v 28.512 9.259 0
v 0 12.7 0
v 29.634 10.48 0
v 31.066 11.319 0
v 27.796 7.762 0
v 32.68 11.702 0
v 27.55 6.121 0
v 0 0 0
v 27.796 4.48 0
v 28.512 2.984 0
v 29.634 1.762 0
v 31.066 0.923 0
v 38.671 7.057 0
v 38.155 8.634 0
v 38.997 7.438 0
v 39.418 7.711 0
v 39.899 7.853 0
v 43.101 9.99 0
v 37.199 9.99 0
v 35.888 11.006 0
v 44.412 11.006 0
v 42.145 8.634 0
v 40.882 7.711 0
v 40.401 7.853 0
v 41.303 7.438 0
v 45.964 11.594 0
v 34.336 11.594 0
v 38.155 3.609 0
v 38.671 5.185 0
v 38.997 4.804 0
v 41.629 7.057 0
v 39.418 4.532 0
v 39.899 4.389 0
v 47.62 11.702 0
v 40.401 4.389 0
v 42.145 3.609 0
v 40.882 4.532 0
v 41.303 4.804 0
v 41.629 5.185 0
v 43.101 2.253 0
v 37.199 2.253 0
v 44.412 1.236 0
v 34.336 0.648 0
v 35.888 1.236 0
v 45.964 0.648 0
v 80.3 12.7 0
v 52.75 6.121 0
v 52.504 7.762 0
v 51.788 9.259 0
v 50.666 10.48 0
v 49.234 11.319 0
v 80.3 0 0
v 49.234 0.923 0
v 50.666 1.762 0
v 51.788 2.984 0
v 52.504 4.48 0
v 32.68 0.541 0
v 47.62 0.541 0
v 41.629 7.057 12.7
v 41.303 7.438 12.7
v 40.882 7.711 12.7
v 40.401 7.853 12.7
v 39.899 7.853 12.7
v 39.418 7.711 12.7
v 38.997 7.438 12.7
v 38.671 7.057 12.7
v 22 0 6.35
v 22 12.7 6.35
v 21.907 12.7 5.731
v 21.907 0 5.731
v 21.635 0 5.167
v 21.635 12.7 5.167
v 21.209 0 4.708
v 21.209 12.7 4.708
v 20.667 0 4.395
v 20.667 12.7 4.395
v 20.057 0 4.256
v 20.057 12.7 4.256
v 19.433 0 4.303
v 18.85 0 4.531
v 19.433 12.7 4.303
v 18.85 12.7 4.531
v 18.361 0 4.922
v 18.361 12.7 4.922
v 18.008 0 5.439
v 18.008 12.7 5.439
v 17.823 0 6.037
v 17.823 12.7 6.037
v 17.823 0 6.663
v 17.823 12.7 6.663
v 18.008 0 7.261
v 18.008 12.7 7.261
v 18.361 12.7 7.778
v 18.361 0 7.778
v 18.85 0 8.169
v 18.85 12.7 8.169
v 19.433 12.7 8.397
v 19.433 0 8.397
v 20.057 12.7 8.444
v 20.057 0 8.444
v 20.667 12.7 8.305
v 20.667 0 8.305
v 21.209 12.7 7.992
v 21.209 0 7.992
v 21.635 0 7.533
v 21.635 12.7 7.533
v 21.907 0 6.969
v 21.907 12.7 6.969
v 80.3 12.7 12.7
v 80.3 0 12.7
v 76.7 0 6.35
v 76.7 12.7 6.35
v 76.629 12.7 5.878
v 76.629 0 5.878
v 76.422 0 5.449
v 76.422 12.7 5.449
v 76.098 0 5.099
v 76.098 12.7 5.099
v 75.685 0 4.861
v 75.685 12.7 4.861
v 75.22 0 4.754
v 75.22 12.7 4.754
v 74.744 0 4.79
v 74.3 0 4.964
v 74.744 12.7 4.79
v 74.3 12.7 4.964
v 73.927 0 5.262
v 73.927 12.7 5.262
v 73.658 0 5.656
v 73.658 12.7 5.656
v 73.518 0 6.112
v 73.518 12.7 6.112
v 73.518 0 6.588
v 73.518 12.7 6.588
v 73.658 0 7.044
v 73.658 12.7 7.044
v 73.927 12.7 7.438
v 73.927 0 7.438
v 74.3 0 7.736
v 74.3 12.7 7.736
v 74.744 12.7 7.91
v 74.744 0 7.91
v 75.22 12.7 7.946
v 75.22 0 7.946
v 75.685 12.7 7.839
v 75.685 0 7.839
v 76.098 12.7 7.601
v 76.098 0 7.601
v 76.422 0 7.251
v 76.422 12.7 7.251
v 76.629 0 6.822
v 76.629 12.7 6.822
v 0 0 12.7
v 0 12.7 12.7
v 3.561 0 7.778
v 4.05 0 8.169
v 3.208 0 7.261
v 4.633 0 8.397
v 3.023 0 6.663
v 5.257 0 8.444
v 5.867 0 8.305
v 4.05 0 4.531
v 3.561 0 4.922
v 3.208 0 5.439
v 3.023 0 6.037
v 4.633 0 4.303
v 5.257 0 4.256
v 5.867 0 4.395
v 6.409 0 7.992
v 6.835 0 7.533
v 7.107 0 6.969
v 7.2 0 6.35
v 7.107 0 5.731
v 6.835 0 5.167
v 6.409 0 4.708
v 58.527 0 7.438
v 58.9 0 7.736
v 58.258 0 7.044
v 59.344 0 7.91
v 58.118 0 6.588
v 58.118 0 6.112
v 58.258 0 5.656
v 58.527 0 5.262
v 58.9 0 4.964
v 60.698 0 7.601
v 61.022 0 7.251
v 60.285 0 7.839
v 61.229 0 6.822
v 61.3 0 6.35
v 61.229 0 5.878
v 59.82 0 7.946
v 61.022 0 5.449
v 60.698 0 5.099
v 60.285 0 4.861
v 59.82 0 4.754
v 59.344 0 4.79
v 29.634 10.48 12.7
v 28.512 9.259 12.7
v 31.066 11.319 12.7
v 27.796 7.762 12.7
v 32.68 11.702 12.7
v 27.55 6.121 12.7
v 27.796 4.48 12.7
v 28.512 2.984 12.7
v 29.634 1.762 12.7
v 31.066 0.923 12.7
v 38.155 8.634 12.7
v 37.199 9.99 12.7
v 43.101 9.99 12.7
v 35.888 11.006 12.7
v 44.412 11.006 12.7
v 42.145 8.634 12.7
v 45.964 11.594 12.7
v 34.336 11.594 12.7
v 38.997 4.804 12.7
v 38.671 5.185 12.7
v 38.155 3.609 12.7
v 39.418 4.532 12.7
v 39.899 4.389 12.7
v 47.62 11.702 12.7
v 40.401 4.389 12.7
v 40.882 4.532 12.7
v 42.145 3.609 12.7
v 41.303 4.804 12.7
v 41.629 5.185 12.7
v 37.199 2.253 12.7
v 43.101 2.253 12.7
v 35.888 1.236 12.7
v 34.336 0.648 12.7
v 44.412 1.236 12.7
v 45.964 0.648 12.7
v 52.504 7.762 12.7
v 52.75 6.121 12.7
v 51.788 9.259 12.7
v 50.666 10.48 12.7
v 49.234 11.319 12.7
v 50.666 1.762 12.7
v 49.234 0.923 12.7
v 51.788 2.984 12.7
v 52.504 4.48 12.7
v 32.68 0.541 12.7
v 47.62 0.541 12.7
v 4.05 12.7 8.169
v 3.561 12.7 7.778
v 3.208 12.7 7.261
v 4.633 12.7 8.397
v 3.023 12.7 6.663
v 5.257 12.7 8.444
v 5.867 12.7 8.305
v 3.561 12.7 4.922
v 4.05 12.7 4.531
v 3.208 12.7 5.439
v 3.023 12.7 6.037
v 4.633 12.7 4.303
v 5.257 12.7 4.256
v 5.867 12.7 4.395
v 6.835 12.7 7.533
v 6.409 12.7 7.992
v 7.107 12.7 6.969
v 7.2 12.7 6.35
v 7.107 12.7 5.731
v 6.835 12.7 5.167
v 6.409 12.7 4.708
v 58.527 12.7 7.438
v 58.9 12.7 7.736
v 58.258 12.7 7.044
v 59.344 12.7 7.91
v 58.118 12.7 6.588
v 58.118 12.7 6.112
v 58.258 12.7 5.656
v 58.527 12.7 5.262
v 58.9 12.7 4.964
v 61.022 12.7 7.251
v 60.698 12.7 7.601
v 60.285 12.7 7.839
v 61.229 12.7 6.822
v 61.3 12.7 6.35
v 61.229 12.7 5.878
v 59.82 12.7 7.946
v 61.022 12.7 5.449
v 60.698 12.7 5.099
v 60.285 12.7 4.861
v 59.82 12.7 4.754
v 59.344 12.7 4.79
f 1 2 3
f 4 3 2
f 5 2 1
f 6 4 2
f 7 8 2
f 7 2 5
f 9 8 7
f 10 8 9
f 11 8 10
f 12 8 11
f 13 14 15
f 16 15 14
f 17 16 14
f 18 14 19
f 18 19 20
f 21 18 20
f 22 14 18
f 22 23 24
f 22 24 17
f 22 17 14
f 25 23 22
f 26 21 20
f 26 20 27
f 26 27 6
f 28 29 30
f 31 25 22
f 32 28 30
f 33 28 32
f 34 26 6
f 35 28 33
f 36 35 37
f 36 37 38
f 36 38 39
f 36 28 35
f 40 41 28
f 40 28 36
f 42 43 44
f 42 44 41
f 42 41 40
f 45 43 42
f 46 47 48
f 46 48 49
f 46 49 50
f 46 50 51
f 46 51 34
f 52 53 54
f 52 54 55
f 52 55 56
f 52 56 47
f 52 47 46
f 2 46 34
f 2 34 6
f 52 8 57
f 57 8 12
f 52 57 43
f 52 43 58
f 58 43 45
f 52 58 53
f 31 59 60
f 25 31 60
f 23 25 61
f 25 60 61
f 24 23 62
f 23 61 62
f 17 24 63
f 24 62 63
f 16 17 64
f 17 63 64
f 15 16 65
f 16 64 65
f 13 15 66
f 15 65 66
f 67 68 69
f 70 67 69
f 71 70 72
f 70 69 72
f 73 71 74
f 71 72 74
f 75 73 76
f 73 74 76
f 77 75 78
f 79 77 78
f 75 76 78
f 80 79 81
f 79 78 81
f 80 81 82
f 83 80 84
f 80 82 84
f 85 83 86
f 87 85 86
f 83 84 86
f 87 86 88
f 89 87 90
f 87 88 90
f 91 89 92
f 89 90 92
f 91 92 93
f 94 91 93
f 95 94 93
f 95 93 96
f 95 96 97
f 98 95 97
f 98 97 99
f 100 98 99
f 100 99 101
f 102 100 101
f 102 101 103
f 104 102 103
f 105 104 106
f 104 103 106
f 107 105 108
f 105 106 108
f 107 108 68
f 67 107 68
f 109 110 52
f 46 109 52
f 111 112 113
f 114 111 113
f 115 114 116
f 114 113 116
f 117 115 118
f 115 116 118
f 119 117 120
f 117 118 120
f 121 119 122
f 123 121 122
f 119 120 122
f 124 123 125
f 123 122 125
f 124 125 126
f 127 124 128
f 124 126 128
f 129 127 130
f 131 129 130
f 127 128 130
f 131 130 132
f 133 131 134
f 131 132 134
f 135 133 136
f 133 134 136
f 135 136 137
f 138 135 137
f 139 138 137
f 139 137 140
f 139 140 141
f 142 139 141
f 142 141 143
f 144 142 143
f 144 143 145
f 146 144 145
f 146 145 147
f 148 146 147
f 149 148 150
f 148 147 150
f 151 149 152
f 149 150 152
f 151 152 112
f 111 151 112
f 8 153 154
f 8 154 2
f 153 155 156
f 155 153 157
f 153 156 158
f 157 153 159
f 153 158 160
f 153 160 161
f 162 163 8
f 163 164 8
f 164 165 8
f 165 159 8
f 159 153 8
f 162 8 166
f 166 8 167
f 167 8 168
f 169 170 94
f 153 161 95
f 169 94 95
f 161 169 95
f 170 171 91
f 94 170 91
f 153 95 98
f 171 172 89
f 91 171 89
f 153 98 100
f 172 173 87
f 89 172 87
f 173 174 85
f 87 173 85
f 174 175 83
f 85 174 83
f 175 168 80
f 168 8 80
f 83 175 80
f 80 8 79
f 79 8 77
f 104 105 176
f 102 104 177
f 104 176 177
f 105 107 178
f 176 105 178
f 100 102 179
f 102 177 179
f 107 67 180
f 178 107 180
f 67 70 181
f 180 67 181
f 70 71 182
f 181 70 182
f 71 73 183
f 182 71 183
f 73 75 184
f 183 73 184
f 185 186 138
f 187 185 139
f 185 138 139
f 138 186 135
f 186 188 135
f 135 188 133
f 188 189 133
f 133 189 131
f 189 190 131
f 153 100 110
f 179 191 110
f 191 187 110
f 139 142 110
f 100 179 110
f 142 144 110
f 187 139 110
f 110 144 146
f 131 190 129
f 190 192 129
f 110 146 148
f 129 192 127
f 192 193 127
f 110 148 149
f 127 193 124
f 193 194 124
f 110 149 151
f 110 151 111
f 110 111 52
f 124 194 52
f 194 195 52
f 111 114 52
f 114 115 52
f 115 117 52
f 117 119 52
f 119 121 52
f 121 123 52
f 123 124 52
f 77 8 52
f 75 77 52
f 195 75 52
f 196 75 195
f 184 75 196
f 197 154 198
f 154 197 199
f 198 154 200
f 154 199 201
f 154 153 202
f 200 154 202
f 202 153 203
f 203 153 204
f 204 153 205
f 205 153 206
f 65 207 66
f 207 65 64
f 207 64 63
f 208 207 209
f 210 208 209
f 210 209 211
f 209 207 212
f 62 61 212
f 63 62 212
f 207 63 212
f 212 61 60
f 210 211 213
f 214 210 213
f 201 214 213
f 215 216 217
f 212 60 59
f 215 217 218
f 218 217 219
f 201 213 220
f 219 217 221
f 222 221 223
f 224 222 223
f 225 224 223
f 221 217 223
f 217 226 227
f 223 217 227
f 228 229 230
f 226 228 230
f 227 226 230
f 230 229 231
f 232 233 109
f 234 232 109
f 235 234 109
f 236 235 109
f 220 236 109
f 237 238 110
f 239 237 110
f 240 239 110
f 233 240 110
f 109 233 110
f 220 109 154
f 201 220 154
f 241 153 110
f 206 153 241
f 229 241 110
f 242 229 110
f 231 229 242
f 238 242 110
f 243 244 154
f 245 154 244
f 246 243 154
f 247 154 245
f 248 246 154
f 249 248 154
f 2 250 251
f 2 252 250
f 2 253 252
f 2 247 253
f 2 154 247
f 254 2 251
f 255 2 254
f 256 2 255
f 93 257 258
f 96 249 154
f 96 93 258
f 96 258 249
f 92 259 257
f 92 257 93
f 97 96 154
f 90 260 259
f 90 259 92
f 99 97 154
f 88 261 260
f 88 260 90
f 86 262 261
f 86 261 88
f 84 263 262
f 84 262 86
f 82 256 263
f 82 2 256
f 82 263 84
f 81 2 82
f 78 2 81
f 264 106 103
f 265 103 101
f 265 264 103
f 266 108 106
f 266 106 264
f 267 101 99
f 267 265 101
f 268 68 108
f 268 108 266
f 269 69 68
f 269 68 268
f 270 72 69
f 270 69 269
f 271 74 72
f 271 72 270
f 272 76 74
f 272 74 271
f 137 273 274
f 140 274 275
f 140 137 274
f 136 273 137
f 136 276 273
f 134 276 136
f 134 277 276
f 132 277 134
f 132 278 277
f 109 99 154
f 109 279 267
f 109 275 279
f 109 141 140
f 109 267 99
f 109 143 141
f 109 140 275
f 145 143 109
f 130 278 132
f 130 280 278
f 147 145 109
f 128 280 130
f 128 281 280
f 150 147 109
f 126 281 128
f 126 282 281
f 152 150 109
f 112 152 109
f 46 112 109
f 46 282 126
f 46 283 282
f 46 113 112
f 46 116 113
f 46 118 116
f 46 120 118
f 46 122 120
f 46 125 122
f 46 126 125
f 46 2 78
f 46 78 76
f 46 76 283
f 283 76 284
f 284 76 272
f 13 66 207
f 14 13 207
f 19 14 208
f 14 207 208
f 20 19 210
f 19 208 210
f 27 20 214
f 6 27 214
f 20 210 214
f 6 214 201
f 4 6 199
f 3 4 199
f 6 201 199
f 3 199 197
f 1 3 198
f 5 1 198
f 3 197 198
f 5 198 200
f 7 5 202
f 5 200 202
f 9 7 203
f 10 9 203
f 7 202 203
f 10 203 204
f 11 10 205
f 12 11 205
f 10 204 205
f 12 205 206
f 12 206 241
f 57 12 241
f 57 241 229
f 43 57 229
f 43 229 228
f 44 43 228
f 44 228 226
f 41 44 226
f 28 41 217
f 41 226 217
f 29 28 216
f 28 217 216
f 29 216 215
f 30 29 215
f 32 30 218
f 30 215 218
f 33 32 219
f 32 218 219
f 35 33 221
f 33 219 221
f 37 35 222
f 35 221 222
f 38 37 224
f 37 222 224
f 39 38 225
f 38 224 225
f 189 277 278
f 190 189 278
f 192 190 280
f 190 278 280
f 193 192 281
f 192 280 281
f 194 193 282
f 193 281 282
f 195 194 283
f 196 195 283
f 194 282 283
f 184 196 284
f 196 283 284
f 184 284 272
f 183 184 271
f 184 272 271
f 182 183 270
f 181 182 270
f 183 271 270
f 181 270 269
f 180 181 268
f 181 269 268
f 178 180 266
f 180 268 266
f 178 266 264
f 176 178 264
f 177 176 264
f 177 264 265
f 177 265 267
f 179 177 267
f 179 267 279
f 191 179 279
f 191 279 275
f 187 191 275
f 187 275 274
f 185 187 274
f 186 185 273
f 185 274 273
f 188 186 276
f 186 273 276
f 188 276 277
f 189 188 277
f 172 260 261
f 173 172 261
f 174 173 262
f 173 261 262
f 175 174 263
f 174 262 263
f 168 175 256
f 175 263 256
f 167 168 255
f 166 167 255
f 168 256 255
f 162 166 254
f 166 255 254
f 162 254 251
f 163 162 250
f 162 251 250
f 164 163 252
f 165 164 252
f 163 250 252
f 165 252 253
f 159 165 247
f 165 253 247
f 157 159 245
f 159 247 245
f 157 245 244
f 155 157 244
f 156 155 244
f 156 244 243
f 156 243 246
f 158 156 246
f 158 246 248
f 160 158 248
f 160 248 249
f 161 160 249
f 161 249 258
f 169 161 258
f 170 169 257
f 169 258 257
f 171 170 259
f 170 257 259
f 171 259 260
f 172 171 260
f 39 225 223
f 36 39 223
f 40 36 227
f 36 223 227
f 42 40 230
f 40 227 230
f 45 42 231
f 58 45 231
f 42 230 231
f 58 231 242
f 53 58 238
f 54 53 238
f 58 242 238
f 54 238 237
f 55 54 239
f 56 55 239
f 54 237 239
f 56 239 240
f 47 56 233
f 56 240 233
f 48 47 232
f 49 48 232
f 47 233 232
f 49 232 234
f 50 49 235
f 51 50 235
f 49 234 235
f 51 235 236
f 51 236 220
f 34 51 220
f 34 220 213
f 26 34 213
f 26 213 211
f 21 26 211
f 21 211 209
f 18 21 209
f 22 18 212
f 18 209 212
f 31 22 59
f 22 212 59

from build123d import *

# Parameters (mm, degrees)
ESQUISSE1_W             = 80.3
ESQUISSE1_H             = 12.7
BOSS_EXTRU_1_DEPTH      = 12.7
ESQUISSE2_R             = 2.1
ESQUISSE2_R_2           = 1.6
ENL_V_MAT_EXTRU_1_DEPTH = 12.7
ENL_V_MAT_EXTRU_2_DEPTH = 12.7


with BuildPart() as part:
    # Esquisse1 → Boss.-Extru.1 (new body)
    with BuildSketch(Plane(origin=(0, 0, 0), x_dir=(1, 0, 0), z_dir=(0, 1, 0))):
        with Locations((40.15, -6.35)):
            Rectangle(ESQUISSE1_W, ESQUISSE1_H)
    extrude(amount=BOSS_EXTRU_1_DEPTH)

    # Esquisse2 → Enlèv. mat.-Extru.1 (cut)
    with BuildSketch(Plane(origin=(0, 12.7, 0), x_dir=(1, 0, 0), z_dir=(0, 1, 0))):
        with Locations((5.1, -6.35)):
            Circle(ESQUISSE2_R)
        with Locations((19.9, -6.35)):
            Circle(ESQUISSE2_R)
        with Locations((59.7, -6.35)):
            Circle(ESQUISSE2_R_2)
        with Locations((75.1, -6.35)):
            Circle(ESQUISSE2_R_2)
    extrude(amount=-ENL_V_MAT_EXTRU_1_DEPTH, mode=Mode.SUBTRACT)

    # Esquisse3 → Enlèv. mat.-Extru.2 (cut)
    with BuildSketch(Plane.XY.offset(12.7)):
        with BuildLine():
            ThreePointArc((38.67125, 7.057070345), (27.55, 6.121229313), (38.67125, 5.185388281))
            ThreePointArc((38.67125, 5.185388281), (40.15, 4.371229313), (41.62875, 5.185388281))
            ThreePointArc((41.62875, 5.185388281), (52.75, 6.121229313), (41.62875, 7.057070345))
            ThreePointArc((41.62875, 7.057070345), (40.15, 7.871229313), (38.67125, 7.057070345))
        make_face()
    extrude(amount=-ENL_V_MAT_EXTRU_2_DEPTH, mode=Mode.SUBTRACT)


solid = part.part
